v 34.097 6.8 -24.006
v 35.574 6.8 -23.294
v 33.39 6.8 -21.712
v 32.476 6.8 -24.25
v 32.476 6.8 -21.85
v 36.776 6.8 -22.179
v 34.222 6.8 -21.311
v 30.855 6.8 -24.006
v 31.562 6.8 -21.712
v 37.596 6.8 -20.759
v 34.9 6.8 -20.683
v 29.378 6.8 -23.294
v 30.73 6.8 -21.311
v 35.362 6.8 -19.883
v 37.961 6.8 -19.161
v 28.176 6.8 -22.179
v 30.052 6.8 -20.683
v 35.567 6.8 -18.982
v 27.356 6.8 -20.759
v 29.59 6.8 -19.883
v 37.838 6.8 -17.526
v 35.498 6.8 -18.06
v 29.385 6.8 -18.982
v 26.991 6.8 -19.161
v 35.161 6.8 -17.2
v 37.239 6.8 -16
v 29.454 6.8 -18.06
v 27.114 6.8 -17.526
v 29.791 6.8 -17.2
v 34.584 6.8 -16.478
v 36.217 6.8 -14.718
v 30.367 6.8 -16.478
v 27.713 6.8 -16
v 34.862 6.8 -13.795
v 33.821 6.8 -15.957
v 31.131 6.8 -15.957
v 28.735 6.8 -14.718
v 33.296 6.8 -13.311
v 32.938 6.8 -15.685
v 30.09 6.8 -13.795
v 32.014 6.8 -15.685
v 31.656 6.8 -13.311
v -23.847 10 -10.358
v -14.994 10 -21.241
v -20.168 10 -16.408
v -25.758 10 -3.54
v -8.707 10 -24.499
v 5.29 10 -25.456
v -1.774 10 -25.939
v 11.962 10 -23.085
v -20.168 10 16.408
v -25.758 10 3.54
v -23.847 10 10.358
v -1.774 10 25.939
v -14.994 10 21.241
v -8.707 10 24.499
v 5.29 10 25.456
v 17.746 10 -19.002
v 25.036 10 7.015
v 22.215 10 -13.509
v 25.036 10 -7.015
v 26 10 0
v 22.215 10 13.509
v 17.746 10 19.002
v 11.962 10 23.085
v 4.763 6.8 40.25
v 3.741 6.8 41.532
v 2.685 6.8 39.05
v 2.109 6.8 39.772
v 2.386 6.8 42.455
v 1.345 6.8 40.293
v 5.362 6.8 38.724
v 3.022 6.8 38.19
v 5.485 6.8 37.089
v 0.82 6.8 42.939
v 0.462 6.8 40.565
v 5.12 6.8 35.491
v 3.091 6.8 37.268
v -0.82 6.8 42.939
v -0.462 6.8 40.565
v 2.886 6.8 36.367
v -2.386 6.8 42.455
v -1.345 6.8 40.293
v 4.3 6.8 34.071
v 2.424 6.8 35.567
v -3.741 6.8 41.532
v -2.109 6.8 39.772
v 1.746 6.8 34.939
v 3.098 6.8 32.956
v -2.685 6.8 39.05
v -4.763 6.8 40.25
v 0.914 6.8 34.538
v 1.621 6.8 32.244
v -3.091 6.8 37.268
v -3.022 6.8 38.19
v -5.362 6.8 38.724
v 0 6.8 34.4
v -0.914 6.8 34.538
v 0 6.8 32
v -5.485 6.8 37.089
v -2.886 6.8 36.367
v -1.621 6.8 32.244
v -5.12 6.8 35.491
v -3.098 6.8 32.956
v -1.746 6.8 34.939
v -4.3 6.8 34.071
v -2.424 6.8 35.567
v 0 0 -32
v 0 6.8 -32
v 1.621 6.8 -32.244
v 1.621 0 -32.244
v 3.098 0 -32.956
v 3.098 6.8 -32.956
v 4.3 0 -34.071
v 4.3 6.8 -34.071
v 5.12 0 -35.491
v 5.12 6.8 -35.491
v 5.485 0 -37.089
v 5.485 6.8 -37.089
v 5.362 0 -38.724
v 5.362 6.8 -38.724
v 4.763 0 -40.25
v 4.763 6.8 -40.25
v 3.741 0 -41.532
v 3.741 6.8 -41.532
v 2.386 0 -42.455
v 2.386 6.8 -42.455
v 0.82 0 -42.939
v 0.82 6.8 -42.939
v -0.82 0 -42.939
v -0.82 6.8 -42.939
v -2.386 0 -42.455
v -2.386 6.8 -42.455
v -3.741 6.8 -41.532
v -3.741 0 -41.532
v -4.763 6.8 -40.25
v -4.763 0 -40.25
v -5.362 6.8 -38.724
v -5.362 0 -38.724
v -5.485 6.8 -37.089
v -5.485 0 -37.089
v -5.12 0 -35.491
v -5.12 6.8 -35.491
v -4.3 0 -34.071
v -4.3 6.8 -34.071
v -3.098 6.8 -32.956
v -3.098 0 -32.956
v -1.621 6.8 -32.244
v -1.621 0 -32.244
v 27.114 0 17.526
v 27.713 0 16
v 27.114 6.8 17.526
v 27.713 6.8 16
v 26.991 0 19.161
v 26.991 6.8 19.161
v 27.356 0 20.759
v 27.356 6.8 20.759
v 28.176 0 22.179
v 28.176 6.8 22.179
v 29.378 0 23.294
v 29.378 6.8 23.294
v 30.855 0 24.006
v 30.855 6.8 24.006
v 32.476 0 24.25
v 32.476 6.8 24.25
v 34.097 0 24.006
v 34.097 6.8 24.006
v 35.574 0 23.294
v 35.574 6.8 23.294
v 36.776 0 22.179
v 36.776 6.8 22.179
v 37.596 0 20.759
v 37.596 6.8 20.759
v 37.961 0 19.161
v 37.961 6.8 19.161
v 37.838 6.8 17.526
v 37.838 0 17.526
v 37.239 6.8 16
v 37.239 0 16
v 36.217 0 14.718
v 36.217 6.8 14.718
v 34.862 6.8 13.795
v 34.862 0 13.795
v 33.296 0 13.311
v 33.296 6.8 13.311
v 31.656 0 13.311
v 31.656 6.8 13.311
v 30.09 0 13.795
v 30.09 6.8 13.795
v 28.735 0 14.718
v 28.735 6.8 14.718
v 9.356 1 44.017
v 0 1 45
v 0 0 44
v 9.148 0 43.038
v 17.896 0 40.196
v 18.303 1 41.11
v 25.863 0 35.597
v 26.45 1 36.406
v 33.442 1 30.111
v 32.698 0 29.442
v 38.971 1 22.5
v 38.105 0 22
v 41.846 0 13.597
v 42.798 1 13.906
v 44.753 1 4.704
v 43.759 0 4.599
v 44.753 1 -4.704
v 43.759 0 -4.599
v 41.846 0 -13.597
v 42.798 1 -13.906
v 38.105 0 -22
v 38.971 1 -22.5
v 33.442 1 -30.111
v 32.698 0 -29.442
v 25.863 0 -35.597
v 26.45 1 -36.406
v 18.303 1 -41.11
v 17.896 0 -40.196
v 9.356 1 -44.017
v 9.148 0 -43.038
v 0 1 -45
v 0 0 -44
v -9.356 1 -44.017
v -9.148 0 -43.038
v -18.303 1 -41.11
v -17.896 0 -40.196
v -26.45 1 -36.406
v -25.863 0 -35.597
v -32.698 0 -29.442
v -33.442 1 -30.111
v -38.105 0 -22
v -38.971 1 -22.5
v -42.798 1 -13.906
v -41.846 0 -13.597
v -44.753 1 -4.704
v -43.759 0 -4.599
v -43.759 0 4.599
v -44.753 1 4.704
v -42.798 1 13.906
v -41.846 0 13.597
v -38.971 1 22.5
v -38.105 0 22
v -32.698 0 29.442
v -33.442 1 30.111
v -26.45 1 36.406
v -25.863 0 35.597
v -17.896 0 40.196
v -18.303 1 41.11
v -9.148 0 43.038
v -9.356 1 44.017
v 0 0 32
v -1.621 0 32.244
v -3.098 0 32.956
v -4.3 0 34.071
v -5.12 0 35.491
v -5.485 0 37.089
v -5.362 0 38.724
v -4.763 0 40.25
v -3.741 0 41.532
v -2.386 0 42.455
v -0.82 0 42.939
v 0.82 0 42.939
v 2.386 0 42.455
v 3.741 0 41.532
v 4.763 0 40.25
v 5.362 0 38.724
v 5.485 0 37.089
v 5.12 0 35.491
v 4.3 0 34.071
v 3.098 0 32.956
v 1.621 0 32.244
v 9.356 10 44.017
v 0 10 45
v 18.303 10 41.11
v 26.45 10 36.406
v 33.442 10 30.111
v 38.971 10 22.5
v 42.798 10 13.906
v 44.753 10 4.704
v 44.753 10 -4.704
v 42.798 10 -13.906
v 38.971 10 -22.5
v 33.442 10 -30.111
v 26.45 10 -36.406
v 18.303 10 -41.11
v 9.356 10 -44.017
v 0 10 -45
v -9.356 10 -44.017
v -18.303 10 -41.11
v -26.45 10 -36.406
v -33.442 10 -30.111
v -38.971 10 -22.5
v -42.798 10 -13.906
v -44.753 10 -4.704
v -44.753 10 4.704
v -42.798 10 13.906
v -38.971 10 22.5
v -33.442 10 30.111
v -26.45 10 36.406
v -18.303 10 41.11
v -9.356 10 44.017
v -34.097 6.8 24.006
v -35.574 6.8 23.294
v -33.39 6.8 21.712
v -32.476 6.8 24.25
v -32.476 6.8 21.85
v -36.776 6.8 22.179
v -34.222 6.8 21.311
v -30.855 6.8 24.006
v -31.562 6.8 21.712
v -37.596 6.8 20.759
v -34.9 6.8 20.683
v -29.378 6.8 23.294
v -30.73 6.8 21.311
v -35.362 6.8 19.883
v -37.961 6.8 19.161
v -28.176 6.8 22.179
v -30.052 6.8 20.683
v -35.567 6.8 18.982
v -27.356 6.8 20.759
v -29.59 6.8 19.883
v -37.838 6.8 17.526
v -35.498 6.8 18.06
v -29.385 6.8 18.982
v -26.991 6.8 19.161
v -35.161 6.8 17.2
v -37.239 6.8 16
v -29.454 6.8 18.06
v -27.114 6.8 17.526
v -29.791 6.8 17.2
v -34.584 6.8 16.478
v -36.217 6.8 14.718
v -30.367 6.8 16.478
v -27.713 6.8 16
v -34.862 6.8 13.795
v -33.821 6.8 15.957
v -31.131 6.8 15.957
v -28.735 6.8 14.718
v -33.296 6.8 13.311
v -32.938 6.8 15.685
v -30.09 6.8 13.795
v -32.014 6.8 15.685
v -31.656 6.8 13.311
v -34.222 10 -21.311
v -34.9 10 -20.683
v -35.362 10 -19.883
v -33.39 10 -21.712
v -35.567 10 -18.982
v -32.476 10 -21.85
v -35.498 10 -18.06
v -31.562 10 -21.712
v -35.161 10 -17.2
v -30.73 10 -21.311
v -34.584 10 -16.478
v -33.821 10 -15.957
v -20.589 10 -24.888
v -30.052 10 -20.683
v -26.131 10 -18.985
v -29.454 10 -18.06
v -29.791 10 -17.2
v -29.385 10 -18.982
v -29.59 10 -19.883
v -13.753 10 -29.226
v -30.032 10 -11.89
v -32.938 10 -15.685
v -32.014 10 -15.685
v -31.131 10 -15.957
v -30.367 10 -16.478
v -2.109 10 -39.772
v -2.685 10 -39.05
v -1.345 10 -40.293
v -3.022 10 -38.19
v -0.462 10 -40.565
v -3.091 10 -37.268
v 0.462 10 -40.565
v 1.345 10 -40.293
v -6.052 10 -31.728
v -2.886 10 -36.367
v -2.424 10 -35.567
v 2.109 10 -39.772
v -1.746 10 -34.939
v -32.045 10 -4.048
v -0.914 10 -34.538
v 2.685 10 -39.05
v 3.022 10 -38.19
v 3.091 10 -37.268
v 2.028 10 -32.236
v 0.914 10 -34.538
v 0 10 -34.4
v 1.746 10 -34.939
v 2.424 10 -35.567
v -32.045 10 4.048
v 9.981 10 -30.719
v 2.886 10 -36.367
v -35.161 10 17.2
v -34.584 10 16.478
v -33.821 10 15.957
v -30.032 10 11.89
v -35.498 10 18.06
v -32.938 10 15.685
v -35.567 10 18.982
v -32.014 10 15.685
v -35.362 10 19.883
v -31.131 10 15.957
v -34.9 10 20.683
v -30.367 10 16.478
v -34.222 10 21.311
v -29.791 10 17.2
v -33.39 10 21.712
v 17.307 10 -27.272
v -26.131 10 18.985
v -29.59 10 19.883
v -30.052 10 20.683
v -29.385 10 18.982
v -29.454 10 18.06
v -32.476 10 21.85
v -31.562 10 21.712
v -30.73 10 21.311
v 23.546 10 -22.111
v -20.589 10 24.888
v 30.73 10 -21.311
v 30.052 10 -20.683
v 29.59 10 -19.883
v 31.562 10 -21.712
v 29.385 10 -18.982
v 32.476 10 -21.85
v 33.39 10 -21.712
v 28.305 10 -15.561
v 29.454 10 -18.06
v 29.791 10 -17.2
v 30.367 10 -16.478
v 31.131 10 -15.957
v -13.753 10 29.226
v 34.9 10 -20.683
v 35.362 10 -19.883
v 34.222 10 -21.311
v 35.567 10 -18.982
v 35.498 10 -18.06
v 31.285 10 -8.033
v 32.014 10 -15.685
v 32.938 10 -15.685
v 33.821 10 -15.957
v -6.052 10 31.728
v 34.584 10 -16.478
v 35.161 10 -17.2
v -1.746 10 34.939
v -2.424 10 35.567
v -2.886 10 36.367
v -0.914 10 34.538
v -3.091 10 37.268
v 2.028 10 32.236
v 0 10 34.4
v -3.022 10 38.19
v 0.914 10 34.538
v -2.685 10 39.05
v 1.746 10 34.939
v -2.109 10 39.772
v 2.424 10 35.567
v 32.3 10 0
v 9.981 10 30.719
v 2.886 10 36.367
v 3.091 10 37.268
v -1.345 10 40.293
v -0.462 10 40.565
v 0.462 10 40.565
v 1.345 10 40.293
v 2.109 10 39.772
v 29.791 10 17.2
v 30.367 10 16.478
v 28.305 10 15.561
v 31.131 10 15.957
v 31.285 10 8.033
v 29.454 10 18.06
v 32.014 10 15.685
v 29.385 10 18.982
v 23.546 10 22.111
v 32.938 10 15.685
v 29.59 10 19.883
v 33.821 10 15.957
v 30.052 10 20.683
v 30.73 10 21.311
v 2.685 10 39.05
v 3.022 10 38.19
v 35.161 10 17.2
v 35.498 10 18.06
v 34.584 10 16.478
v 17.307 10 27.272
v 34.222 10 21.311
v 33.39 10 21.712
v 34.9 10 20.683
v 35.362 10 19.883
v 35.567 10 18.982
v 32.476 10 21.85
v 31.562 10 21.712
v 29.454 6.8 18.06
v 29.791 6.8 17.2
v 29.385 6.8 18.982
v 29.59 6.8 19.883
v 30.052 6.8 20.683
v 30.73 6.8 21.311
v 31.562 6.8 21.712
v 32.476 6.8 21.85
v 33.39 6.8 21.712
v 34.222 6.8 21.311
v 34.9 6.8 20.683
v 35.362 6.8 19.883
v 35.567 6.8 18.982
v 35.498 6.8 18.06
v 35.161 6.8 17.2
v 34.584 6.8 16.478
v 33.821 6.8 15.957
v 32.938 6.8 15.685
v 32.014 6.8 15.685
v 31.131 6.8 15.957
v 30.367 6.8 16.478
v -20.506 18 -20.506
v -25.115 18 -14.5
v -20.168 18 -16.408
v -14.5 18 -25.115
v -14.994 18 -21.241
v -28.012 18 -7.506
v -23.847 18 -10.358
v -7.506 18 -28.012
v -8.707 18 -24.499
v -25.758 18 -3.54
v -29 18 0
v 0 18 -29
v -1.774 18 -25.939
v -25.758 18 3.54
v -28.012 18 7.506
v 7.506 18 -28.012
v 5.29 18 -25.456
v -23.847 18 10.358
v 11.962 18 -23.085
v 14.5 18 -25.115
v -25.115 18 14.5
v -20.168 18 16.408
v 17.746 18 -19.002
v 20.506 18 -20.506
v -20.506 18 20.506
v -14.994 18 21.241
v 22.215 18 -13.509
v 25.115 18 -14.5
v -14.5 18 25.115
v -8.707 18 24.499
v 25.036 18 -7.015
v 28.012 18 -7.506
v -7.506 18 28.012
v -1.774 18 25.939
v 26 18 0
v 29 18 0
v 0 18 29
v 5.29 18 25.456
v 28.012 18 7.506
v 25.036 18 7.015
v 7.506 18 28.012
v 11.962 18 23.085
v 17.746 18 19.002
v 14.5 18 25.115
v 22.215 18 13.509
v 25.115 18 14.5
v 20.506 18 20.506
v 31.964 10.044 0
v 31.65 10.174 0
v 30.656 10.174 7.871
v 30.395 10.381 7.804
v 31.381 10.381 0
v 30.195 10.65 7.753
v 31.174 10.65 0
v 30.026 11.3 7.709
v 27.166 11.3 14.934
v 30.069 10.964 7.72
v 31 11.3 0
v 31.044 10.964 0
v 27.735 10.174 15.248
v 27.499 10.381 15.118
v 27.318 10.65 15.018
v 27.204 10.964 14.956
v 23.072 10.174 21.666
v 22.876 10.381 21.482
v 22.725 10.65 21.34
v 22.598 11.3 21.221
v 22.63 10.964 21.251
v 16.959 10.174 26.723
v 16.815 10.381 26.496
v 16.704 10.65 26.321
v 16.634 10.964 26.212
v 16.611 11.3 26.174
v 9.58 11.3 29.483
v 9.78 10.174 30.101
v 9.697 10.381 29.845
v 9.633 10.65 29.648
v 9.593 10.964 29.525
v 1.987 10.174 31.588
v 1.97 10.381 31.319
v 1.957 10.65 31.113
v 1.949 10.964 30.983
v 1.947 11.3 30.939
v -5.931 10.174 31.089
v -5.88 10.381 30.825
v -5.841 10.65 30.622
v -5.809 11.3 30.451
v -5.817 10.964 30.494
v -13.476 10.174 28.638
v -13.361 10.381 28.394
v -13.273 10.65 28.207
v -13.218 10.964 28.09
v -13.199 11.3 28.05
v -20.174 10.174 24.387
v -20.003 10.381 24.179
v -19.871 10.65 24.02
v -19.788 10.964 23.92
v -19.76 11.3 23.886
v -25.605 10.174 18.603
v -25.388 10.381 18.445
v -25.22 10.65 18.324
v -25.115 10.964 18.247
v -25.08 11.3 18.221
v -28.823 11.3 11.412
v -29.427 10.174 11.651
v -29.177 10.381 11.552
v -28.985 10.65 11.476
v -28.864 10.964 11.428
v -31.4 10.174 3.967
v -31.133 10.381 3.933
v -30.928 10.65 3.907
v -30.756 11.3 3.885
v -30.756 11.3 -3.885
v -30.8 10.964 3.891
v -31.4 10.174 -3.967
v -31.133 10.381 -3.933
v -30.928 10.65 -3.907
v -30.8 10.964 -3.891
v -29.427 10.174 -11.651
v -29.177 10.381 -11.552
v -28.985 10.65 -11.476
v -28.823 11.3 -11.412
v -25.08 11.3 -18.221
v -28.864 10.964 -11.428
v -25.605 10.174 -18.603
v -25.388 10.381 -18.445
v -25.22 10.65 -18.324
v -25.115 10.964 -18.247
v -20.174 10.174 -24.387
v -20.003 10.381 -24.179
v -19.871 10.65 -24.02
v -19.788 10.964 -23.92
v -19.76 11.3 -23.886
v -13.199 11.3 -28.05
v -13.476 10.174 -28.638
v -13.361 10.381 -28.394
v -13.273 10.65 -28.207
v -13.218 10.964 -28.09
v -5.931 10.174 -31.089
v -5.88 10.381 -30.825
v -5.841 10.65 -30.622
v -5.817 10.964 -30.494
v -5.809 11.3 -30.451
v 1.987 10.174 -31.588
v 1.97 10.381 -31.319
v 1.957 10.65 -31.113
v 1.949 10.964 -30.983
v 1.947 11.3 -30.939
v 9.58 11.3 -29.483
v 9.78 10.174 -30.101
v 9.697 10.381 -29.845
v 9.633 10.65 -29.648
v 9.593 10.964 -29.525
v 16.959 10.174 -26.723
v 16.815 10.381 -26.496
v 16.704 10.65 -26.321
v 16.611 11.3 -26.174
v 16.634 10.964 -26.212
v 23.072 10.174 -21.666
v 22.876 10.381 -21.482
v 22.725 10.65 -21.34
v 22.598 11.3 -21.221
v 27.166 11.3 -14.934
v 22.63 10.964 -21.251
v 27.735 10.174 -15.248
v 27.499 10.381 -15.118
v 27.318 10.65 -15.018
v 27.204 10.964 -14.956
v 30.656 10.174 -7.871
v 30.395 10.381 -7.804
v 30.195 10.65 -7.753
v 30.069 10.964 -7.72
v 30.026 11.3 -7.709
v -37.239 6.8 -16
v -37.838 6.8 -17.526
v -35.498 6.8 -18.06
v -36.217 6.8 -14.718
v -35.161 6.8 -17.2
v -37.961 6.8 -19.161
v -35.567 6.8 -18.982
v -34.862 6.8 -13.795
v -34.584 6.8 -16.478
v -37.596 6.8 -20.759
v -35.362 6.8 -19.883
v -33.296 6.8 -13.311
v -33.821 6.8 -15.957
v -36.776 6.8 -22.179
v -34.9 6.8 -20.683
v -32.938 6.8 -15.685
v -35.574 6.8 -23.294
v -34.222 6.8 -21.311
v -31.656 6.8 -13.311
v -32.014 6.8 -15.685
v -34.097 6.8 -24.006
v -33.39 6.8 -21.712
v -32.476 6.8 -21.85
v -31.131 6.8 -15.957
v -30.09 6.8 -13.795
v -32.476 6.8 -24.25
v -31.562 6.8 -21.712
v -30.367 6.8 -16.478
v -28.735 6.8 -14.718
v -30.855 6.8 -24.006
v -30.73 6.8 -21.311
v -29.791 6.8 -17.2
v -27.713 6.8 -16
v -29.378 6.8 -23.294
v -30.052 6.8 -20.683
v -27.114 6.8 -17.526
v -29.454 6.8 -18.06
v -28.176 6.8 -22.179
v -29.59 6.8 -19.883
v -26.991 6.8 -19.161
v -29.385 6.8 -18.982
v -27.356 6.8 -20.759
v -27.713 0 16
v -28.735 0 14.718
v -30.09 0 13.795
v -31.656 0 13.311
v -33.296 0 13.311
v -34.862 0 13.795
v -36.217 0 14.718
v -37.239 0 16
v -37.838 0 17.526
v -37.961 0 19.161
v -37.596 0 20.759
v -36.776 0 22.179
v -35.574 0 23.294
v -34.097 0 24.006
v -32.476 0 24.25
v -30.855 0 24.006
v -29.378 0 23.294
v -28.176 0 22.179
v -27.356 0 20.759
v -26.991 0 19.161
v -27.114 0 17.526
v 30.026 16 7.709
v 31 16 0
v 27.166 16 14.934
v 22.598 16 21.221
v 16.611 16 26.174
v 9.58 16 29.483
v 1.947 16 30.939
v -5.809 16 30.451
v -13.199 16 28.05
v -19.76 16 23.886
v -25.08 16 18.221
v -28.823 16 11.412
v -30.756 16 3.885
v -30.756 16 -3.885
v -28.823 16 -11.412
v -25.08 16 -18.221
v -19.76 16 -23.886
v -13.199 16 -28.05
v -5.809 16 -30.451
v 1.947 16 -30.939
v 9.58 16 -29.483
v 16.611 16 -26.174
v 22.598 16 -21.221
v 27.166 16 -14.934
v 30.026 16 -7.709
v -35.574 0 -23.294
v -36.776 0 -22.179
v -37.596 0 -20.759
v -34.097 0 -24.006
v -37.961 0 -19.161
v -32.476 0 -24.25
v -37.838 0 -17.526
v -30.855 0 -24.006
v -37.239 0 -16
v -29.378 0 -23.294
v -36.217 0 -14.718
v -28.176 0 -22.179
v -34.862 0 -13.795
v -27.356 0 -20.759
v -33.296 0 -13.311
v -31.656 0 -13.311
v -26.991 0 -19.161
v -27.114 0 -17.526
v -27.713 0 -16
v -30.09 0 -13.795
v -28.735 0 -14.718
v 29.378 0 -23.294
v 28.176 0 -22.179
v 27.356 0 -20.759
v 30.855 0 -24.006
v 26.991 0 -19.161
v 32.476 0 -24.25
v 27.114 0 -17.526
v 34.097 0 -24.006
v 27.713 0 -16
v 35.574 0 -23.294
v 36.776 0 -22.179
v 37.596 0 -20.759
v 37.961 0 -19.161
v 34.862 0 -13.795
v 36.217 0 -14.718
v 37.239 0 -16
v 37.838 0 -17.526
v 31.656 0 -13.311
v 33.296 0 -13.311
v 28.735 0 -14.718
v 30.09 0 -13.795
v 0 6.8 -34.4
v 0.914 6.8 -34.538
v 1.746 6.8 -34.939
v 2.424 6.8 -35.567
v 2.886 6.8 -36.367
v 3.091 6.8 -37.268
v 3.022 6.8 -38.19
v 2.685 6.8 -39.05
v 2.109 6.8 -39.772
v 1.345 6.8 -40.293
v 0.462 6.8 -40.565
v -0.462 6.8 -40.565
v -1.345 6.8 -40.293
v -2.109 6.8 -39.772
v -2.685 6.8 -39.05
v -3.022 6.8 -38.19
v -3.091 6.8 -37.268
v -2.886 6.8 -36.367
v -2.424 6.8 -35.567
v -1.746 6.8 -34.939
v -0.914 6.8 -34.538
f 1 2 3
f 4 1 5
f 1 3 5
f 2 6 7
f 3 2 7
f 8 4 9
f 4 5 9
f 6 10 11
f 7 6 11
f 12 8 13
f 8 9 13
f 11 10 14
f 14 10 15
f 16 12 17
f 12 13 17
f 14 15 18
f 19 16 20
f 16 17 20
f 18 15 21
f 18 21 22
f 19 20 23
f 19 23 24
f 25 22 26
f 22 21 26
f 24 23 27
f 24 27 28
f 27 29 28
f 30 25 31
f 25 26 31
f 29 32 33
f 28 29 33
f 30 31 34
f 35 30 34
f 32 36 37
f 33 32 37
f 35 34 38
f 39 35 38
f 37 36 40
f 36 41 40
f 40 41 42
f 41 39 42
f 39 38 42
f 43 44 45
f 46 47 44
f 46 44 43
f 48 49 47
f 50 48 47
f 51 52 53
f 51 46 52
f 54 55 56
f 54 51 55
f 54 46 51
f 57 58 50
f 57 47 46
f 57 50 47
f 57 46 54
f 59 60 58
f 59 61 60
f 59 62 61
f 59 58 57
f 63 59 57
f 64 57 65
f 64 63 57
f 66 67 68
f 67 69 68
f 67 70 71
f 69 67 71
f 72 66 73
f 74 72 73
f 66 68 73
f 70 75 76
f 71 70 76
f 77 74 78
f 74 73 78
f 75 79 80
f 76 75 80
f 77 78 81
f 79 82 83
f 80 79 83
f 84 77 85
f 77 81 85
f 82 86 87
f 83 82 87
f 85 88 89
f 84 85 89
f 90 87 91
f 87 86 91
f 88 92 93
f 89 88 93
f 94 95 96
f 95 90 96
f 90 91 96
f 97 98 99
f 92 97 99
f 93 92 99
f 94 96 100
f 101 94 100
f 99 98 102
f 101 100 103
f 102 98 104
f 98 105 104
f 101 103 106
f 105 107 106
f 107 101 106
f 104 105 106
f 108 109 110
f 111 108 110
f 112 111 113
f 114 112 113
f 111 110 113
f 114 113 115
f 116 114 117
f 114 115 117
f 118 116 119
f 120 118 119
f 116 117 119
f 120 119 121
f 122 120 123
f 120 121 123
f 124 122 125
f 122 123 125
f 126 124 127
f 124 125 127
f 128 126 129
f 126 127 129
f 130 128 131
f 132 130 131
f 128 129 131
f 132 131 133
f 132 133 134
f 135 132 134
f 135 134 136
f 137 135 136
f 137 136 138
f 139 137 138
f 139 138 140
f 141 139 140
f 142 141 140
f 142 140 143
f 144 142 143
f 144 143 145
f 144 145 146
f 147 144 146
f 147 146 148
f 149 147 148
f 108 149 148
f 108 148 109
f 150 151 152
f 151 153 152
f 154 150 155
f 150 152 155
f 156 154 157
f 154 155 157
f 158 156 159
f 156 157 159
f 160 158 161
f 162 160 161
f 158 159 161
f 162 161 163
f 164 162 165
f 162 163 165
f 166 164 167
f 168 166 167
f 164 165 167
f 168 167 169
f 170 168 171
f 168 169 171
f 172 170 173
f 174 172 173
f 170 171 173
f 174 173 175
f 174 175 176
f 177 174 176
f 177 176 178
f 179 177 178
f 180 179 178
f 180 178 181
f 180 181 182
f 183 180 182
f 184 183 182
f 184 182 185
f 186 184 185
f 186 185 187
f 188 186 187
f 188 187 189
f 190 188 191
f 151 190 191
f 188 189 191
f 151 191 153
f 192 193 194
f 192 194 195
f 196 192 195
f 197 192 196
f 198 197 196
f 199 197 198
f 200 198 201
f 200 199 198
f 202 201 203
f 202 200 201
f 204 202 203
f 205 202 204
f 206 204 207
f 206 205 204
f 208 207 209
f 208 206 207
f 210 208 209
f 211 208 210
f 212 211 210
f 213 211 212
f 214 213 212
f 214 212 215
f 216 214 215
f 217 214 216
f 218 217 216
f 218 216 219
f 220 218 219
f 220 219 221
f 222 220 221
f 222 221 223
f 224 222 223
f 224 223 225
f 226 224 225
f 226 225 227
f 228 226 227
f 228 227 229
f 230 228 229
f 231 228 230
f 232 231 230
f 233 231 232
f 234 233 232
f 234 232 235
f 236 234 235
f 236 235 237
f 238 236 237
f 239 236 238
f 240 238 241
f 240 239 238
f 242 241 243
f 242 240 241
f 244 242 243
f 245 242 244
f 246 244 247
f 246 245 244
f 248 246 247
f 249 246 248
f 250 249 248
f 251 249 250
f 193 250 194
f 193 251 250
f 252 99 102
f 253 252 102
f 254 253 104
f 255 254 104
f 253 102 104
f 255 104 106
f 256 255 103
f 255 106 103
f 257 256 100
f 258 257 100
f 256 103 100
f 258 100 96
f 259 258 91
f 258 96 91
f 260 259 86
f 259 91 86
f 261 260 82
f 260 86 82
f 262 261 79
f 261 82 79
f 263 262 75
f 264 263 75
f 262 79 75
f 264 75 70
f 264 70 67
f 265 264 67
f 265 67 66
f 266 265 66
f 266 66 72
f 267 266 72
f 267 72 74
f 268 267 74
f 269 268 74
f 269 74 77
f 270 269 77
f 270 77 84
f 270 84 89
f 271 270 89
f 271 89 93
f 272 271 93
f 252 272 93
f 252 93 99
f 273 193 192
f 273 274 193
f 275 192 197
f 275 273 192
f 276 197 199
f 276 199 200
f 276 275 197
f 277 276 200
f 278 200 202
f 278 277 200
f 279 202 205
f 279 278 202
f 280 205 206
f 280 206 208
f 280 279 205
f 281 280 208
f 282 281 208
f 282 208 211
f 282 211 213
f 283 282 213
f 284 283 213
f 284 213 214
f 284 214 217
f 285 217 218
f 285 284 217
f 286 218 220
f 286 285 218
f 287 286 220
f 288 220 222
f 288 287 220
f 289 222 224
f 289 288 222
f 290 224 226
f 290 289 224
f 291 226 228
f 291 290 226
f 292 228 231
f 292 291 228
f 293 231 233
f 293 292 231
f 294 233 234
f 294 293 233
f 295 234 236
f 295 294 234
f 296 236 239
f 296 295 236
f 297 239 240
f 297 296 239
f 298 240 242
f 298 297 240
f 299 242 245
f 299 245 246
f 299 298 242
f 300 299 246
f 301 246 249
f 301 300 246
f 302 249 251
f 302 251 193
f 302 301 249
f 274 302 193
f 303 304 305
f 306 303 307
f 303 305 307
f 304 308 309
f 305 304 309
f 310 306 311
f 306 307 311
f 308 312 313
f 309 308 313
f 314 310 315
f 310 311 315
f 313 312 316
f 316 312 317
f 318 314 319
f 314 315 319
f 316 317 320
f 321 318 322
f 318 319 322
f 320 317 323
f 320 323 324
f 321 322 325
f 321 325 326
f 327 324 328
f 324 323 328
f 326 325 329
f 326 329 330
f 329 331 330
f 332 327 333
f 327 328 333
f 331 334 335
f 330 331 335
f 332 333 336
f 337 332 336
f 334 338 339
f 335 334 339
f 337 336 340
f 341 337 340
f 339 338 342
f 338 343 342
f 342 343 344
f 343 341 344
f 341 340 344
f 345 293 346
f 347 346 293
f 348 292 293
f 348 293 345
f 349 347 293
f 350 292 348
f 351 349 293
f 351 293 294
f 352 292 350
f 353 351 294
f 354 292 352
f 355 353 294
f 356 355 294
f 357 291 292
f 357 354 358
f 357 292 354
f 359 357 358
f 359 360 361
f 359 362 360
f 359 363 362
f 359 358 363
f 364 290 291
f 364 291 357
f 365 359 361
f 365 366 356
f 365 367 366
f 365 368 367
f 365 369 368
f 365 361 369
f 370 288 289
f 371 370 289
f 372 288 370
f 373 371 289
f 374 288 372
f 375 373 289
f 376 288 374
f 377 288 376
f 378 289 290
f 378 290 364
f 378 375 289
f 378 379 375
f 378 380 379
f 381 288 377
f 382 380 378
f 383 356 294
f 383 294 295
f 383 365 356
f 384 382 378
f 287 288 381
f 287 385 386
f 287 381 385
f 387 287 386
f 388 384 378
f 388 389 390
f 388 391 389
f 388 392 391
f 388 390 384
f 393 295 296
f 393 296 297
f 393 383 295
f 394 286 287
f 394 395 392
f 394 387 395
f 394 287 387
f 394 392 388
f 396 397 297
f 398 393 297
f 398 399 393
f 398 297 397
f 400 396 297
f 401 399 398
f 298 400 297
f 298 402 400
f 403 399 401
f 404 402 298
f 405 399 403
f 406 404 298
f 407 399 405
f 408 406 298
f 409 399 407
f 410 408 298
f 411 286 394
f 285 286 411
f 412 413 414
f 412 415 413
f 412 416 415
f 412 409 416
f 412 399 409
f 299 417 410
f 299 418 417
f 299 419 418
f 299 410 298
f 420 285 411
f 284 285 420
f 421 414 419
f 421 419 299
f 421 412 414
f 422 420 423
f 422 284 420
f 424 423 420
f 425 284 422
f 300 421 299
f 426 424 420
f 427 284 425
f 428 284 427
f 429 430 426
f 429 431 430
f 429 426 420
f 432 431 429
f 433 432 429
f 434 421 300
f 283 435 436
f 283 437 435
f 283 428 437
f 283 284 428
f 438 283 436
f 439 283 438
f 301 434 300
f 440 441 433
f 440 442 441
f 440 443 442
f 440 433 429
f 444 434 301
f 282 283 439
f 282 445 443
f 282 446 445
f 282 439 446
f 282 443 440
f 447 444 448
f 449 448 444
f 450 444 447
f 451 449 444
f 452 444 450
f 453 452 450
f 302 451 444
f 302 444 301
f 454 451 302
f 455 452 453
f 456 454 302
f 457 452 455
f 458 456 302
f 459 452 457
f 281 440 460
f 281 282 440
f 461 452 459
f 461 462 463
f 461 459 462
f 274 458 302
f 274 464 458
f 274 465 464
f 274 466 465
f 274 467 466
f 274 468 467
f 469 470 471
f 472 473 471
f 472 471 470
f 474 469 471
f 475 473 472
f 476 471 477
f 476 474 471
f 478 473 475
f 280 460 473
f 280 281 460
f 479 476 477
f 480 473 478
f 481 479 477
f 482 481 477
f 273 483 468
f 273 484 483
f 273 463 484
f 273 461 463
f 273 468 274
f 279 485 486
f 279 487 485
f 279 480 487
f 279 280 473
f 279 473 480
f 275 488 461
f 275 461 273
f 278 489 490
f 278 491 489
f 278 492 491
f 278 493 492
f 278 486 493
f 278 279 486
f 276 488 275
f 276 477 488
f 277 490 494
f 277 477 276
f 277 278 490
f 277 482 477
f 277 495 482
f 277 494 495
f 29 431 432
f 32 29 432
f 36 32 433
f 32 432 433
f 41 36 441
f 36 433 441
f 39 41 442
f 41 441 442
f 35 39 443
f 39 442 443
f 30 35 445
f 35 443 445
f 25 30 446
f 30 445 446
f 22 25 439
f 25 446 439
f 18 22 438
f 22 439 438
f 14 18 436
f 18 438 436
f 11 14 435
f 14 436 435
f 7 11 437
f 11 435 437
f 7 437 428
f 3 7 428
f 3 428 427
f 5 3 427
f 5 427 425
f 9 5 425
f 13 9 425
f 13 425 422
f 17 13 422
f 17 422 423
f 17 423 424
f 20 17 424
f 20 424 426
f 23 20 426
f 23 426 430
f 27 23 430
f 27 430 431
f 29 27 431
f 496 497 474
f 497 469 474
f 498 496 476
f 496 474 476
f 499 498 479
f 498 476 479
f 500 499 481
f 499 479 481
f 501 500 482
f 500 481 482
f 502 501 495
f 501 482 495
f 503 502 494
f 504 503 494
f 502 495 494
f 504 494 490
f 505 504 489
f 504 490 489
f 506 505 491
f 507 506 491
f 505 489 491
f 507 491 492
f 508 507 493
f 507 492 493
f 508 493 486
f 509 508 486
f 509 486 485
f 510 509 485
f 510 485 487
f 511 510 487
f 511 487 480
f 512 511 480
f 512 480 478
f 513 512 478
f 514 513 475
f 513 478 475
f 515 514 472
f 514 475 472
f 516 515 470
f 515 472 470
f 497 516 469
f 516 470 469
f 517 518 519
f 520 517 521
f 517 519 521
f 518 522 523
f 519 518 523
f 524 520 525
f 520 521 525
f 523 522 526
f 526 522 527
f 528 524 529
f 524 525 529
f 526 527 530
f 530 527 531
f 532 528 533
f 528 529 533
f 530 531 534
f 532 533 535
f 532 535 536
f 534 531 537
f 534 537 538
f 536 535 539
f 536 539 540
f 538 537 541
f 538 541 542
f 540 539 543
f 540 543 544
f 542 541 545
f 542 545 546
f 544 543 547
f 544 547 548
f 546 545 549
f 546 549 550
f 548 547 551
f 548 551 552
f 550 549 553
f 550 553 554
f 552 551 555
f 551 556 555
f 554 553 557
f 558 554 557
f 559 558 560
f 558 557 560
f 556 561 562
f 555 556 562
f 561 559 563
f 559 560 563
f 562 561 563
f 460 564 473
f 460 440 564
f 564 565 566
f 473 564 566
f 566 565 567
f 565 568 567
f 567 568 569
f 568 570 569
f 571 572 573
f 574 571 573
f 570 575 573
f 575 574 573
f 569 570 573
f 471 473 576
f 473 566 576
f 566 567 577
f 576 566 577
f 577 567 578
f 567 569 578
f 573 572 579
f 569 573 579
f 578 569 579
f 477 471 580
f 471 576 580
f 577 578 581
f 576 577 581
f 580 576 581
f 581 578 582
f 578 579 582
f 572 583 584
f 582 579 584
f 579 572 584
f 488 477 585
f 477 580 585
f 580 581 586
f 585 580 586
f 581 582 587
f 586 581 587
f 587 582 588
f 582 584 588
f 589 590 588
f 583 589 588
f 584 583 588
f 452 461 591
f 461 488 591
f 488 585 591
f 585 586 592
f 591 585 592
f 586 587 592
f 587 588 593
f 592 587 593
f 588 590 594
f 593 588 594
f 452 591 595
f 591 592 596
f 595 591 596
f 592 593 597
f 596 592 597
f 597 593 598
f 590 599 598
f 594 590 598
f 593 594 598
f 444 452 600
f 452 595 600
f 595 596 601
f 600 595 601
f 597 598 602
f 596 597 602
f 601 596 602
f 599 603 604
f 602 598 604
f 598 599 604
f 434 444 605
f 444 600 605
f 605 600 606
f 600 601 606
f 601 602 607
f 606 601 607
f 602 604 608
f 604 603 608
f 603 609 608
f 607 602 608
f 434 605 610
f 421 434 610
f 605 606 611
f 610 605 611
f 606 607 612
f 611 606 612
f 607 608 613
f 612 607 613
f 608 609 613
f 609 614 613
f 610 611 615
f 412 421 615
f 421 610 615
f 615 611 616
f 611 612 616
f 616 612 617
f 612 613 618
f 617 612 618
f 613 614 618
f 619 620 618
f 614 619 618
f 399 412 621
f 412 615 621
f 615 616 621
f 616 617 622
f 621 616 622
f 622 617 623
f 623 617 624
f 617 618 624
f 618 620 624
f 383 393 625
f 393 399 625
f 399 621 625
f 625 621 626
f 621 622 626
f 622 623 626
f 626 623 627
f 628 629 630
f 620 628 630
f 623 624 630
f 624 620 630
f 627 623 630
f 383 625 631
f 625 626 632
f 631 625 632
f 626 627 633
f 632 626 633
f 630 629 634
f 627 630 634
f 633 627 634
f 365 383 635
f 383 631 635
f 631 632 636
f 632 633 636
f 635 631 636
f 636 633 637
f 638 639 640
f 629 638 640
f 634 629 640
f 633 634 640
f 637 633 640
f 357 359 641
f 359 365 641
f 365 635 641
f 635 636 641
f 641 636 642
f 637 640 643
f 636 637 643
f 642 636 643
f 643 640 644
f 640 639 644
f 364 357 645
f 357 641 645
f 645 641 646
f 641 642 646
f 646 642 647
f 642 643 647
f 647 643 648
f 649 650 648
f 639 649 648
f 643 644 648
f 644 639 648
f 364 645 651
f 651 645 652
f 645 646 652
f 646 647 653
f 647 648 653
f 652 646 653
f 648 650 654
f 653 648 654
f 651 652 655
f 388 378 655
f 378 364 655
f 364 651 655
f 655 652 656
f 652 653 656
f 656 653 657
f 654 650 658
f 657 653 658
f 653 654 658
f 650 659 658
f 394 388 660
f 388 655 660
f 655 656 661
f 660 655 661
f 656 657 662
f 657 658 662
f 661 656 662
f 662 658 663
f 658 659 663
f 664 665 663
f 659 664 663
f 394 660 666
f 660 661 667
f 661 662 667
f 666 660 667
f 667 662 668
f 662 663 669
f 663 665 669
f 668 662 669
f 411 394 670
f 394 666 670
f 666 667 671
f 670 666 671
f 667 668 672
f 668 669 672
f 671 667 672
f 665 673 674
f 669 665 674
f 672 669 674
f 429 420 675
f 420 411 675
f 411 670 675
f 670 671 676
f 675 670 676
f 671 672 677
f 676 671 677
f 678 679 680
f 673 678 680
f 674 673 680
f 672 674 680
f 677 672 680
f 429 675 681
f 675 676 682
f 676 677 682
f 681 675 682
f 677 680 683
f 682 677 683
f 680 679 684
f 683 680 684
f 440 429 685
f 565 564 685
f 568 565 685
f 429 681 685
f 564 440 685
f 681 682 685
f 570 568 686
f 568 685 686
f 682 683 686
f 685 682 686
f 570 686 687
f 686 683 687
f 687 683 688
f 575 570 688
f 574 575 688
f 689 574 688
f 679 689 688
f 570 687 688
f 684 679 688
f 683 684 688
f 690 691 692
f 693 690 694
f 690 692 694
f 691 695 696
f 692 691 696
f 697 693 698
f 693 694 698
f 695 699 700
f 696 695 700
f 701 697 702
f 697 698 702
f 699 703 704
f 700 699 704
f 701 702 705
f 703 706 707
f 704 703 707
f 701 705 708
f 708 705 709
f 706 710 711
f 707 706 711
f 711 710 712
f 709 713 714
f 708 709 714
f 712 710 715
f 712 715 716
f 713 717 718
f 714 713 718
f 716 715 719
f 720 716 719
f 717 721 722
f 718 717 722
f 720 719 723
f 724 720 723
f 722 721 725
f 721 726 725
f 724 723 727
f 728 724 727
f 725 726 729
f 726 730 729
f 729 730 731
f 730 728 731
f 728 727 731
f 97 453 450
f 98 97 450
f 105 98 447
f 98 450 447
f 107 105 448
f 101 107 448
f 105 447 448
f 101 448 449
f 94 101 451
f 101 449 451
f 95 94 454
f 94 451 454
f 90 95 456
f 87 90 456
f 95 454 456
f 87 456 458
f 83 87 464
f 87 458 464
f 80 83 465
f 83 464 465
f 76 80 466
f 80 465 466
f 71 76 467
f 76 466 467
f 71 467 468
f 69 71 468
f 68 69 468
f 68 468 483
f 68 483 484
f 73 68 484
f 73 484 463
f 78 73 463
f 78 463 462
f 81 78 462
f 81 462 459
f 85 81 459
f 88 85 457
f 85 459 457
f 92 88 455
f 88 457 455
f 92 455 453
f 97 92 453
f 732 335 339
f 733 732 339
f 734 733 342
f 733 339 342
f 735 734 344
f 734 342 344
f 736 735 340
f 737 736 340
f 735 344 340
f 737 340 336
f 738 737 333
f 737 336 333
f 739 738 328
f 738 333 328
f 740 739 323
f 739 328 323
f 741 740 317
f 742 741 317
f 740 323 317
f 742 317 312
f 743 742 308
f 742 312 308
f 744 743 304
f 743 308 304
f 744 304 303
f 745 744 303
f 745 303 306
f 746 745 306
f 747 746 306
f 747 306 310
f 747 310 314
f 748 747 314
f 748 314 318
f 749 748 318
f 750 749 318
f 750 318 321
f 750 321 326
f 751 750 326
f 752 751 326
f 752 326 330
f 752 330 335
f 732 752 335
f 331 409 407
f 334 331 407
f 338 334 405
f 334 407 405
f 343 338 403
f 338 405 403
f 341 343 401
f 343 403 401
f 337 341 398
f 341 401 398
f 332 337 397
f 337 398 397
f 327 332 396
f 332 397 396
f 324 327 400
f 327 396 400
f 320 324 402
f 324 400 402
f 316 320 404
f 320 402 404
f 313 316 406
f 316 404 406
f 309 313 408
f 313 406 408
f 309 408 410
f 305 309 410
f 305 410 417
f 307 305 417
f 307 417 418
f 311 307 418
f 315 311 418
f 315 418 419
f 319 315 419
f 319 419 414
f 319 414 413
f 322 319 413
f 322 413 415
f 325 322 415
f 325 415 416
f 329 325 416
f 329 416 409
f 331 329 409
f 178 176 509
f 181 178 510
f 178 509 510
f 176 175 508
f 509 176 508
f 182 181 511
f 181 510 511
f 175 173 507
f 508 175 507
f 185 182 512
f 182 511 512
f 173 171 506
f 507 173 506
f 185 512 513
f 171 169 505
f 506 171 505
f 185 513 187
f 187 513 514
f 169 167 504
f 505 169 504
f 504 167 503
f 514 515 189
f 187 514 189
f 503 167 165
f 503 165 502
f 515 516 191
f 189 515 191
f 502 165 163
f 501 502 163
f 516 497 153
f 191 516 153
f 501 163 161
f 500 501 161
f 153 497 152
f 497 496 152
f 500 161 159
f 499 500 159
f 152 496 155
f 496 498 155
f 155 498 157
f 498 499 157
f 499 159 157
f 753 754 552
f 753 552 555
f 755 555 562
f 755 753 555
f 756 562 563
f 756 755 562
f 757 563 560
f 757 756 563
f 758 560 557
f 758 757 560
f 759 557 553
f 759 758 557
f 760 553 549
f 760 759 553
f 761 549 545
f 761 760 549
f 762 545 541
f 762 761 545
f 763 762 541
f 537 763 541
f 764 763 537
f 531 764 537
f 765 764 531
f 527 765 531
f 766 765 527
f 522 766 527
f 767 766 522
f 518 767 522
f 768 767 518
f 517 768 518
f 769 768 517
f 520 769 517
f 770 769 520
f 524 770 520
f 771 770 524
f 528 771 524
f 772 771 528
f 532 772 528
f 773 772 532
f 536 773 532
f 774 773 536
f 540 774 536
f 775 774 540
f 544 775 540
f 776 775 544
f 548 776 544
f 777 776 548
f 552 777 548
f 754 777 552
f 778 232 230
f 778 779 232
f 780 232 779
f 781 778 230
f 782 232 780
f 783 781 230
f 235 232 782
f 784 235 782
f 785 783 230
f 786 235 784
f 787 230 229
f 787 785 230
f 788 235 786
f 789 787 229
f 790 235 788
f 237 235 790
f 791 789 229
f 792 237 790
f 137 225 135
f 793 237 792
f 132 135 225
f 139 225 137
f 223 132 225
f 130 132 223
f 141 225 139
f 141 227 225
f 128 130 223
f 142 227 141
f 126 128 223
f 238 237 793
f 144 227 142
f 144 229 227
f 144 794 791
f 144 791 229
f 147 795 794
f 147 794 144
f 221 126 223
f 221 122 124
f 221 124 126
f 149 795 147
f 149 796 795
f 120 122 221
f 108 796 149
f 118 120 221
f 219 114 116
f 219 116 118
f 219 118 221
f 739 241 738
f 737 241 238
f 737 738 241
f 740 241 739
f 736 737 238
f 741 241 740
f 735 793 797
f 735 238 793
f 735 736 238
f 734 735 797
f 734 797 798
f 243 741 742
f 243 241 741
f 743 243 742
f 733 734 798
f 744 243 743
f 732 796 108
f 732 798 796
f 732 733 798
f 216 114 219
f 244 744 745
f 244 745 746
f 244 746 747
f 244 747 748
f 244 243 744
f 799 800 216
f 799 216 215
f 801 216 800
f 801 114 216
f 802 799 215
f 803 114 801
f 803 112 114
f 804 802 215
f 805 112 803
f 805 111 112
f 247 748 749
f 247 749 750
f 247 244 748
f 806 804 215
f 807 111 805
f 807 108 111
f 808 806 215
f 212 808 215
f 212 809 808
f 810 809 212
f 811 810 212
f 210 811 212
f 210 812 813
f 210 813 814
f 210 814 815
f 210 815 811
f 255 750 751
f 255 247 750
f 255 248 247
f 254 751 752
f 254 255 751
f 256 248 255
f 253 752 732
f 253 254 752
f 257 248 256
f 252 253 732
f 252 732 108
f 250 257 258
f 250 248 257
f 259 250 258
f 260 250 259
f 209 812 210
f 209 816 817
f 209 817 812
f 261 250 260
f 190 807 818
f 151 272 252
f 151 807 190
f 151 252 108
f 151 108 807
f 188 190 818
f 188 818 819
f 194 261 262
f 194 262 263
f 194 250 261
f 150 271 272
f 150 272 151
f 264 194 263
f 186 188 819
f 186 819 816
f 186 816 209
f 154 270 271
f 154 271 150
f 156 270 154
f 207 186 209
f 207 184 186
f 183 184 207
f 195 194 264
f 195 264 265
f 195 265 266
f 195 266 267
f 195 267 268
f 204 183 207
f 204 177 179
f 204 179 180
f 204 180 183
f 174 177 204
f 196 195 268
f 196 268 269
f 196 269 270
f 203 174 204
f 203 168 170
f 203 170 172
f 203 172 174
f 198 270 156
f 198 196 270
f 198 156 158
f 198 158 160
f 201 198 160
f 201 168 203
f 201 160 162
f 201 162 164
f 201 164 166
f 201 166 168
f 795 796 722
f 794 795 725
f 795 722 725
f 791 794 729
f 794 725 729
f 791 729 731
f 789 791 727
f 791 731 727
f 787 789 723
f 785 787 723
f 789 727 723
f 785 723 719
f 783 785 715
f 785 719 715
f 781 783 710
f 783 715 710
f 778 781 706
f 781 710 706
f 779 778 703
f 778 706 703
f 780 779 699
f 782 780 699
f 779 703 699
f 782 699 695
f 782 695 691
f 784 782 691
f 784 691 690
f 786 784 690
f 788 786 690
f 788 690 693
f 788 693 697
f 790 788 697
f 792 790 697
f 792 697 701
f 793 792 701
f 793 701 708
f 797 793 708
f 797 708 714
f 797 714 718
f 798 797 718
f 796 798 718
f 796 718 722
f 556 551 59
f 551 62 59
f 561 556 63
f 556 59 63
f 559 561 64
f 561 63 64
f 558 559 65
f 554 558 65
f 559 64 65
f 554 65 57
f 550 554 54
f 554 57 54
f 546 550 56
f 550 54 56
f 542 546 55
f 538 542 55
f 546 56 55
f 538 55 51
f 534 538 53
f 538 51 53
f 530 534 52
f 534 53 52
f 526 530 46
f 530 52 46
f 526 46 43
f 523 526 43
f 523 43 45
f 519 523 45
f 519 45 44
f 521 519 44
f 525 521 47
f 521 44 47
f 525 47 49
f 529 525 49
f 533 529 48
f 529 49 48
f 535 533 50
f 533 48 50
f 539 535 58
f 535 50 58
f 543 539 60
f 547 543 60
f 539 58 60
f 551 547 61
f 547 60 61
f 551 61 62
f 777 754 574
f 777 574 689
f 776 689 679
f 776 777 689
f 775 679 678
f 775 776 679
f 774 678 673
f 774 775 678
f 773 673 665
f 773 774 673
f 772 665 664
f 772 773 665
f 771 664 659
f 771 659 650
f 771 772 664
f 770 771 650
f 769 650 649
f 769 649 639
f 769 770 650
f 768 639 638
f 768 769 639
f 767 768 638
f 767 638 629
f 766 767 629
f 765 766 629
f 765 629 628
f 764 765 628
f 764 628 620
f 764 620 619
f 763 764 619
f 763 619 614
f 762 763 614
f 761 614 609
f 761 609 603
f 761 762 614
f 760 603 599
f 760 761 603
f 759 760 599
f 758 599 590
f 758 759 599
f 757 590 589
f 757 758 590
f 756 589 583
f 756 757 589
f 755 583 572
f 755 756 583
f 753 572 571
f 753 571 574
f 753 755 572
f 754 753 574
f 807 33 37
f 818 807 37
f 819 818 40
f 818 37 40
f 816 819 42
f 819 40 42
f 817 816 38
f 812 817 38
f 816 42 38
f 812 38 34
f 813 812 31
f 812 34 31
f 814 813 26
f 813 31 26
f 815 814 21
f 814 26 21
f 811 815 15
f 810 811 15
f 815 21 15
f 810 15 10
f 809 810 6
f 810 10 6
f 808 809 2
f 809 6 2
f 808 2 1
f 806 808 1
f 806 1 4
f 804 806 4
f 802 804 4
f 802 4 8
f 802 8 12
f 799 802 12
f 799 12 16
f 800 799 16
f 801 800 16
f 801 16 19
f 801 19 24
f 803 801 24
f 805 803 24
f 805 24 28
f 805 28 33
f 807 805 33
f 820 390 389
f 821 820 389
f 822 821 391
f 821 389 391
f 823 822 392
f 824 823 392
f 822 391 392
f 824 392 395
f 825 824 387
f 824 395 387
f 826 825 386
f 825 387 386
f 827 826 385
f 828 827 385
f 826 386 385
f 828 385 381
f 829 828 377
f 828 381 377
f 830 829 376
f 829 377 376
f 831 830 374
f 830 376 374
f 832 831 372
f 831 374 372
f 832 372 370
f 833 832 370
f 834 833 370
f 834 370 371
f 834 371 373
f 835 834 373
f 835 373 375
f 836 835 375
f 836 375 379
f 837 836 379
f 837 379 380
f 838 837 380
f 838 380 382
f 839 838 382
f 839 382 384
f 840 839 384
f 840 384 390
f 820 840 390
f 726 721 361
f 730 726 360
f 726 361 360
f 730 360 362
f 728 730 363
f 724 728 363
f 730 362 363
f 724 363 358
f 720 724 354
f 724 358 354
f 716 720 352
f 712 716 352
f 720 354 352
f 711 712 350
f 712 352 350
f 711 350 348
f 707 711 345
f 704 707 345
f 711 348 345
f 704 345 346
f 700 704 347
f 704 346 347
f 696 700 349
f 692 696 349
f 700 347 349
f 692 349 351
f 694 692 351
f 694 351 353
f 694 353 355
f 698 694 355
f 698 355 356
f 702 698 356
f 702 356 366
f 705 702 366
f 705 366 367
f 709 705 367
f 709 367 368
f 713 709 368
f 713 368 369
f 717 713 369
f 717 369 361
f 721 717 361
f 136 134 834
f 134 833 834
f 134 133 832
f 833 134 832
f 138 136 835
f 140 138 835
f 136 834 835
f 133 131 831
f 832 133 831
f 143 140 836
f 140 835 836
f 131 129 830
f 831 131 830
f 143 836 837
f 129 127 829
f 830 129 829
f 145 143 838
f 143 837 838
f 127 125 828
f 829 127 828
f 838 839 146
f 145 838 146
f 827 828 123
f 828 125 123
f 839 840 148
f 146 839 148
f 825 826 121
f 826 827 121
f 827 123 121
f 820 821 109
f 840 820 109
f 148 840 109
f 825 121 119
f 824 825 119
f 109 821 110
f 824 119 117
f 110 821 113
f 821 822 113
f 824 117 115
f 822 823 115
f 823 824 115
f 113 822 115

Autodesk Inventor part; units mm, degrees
ref_plane "YZ Plane" through (0, 0, 0) normal (1, 0, 0) x (0, 1, 0)
ref_plane "XZ Plane" through (0, 0, 0) normal (0, 1, 0) x (-1, 0, 0)
ref_plane "XY Plane" through (0, 0, 0) normal (0, 0, 1) x (1, 0, 0)
sketch "Эскиз1" plane through (0, 0, 0) normal (0, 0, 1) x (1, 0, 0)
  line L0 (0, 5) -> (0, 0)
  line L1 (0, 0) -> (31, 0)
  line L2 (31, 0) -> (31, 18)
  line L3 (31, 18) -> (26, 18)
  line L4 (26, 18) -> (26, 5)
  line L5 (26, 5) -> (0, 5)
  dimension "d0" = 18
  dimension "d1" = 5
  dimension "d3" = 31
revolve "Вращение1" add sketch "Эскиз1" angle 360 about axis through (0, 5, 0) along (0, -1, 0)
sketch "Эскиз2" plane through (0, 0, 0) normal (1, 0, 0) x (0, 1, 0)
  line L0 (0, 31) -> (0, -31) projected
  line L1 (18, 31) -> (0, 31) projected
  line L2 (18, 31) -> (0, 31) projected
  line L3 (0, 0) -> (0, 45)
  line L4 (0, 45) -> (10, 45)
  line L5 (10, 45) -> (10, 0)
  line L6 (10, 0) -> (0, 0)
  line L7 (-4.2, 0) -> (25.2, 0) projected
  dimension "d5" = 10
  dimension "d6" = 45
revolve "Вращение2" add sketch "Эскиз2" angle 360 about axis through (0, -10, 0) along (0, 1, 0)
sketch "Эскиз3" plane through (0, 0, 0) normal (0, -1, 0) x (1, 0, 0)
  line L0 (0, -63) -> (0, 63) projected
  line L1 (-63, 0) -> (63, 0) projected
  circle A0 centre (0, 0) radius 37.5 construction
  circle A1 centre (0, 37.5) radius 5.5
  dimension "d8" = 75
  dimension "d9" = 11
hole "Отверстие1" at (0, 0, 37.5) direction (0, 1, 0) diameter 6.2 depth 15 tip angle 118 counterbore diameter 11 counterbore depth 6.8
pattern_circular "Круговой массив1" count 6 over 360 about axis through (0, -10, 0) along (0, 1, 0) of "Отверстие1"
fillet "Сопряжение1" radius 1.3 1 edges at (-31, 10, 0)
chamfer "Фаска1" distance 1 angle 45 1 edges at (0, 0, -45)
chamfer "Фаска2" distance 2 angle 45 1 edges at (-31, 18, 0)
properties part number "Крышка маленькая_62"
